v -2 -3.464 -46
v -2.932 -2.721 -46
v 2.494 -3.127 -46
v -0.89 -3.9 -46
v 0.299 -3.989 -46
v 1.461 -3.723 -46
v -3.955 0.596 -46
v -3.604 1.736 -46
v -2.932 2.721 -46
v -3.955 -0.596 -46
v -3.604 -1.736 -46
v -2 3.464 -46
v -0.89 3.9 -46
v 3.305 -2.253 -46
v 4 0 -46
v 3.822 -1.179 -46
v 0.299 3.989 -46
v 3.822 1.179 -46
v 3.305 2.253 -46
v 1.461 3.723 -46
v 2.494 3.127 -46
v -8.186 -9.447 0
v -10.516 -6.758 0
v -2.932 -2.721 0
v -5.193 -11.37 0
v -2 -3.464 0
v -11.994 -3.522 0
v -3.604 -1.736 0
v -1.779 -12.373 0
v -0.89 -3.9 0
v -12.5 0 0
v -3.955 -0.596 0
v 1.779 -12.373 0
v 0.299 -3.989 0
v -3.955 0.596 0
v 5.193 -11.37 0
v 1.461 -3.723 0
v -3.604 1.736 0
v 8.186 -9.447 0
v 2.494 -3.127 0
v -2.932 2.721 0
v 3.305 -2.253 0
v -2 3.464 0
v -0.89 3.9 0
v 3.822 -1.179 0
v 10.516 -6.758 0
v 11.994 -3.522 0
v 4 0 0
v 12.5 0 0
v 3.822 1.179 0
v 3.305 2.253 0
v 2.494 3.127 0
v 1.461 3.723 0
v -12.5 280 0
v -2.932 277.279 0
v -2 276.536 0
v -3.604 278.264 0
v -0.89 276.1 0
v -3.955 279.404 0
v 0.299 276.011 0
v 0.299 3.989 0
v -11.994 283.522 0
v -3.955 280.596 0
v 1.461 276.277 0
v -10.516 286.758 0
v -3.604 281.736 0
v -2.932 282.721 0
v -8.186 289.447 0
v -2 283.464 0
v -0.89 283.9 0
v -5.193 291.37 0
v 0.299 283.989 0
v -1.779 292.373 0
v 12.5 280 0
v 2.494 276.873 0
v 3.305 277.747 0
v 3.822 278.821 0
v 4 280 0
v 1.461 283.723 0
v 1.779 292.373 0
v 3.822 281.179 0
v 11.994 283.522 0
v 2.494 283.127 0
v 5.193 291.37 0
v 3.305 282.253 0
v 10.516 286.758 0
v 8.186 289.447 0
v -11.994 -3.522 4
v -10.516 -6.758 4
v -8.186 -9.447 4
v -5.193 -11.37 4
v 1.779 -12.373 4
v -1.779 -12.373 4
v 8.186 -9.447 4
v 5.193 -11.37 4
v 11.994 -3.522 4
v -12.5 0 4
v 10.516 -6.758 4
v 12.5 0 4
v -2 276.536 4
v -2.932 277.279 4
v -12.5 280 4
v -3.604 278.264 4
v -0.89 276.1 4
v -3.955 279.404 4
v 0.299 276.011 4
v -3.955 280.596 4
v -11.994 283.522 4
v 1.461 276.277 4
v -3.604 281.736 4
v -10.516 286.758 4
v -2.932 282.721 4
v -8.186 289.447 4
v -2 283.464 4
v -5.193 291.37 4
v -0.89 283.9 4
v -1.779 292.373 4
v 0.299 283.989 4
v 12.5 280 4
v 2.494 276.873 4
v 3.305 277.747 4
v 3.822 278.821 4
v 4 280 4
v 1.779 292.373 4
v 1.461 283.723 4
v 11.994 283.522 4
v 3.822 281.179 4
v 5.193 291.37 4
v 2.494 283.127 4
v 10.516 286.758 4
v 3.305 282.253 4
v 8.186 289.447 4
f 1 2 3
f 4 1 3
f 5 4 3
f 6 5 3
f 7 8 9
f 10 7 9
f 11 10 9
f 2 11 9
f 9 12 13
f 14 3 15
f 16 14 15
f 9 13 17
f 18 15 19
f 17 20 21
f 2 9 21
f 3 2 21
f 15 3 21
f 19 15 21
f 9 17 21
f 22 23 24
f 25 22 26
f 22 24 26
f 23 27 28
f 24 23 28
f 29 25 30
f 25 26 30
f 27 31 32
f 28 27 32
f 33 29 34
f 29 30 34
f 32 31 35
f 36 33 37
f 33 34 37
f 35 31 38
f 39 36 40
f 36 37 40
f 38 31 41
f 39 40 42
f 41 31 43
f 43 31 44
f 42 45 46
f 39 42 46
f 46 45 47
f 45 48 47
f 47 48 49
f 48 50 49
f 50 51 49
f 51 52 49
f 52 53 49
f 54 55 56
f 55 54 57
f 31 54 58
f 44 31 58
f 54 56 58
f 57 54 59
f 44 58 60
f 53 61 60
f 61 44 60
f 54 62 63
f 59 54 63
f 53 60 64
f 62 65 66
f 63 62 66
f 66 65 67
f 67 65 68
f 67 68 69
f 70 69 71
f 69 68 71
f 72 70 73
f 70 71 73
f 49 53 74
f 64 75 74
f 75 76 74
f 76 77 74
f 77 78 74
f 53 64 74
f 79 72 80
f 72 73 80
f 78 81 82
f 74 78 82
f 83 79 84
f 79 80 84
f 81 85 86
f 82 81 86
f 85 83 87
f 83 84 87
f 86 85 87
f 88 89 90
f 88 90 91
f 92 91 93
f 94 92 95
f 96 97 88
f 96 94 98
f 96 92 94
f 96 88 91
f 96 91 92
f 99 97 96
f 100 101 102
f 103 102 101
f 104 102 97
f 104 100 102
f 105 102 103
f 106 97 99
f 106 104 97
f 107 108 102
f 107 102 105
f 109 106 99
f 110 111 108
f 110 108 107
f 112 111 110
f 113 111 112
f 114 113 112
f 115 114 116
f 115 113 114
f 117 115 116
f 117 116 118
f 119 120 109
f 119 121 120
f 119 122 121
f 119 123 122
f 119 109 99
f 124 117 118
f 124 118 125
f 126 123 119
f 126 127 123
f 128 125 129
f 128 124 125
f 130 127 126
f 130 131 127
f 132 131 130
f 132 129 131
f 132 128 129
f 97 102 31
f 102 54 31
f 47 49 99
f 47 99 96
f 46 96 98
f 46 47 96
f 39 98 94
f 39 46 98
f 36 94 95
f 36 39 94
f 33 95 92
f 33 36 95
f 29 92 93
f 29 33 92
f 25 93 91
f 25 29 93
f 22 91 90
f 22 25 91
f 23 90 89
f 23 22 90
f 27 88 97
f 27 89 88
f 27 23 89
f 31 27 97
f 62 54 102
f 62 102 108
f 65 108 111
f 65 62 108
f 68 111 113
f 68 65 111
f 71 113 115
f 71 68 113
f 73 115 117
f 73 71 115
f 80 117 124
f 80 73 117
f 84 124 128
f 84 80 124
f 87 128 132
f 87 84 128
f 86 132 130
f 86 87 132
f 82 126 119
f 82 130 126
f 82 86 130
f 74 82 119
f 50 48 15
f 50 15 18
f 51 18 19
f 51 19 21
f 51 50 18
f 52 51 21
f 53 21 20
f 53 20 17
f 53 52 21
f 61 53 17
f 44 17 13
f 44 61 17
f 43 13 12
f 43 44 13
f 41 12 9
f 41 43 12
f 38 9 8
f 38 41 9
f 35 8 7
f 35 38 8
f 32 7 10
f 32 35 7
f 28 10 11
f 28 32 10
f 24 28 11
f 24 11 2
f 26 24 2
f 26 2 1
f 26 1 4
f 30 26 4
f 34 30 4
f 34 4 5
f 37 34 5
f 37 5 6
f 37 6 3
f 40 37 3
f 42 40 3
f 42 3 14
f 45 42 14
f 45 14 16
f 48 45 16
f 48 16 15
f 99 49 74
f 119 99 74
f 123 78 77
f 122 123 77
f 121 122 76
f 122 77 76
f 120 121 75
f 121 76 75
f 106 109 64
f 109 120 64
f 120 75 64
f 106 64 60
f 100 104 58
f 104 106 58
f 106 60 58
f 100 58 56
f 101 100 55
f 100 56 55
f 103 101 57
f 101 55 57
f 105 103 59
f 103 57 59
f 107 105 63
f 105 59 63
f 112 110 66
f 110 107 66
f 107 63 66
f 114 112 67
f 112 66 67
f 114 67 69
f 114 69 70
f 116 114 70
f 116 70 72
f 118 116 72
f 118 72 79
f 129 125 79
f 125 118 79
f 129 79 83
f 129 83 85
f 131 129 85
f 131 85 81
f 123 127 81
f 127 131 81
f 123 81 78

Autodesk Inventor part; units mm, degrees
ref_plane "YZ Plane" through (0, 0, 0) normal (1, 0, 0) x (0, 1, 0)
ref_plane "XZ Plane" through (0, 0, 0) normal (0, 1, 0) x (-1, 0, 0)
ref_plane "XY Plane" through (0, 0, 0) normal (0, 0, 1) x (1, 0, 0)
sketch "Sketch1" plane through (0, 0, 0) normal (0, 0, 1) x (1, 0, 0)
  circle A0 centre (0, 0) radius 4
  circle A1 centre (0, 0) radius 12.5
  circle A2 centre (0, 280) radius 4
  circle A3 centre (0, 280) radius 12.5
  line L0 (12.5, 0) -> (12.5, 280)
  line L1 (-12.5, 280) -> (-12.5, 0)
  dimension "d0" = 8
  dimension "d1" = 25
  dimension "d2" = 280
  dimension "d3" = 0
  dimension "d4" = 8
  dimension "d5" = 25
extrude "Extrusion1" add sketch "Sketch1" along normal blind 4
sketch "Sketch2" plane through (0, 0, 4) normal (0, 0, 1) x (1, 0, 0)
  circle A0 centre (0, 0) radius 4 projected
extrude "Extrusion2" add sketch "Sketch2" against normal blind 50
equation "\"d4\" = d0"
equation "\"d5\" = d1"
properties part number "ramie cięgna traction loss"
